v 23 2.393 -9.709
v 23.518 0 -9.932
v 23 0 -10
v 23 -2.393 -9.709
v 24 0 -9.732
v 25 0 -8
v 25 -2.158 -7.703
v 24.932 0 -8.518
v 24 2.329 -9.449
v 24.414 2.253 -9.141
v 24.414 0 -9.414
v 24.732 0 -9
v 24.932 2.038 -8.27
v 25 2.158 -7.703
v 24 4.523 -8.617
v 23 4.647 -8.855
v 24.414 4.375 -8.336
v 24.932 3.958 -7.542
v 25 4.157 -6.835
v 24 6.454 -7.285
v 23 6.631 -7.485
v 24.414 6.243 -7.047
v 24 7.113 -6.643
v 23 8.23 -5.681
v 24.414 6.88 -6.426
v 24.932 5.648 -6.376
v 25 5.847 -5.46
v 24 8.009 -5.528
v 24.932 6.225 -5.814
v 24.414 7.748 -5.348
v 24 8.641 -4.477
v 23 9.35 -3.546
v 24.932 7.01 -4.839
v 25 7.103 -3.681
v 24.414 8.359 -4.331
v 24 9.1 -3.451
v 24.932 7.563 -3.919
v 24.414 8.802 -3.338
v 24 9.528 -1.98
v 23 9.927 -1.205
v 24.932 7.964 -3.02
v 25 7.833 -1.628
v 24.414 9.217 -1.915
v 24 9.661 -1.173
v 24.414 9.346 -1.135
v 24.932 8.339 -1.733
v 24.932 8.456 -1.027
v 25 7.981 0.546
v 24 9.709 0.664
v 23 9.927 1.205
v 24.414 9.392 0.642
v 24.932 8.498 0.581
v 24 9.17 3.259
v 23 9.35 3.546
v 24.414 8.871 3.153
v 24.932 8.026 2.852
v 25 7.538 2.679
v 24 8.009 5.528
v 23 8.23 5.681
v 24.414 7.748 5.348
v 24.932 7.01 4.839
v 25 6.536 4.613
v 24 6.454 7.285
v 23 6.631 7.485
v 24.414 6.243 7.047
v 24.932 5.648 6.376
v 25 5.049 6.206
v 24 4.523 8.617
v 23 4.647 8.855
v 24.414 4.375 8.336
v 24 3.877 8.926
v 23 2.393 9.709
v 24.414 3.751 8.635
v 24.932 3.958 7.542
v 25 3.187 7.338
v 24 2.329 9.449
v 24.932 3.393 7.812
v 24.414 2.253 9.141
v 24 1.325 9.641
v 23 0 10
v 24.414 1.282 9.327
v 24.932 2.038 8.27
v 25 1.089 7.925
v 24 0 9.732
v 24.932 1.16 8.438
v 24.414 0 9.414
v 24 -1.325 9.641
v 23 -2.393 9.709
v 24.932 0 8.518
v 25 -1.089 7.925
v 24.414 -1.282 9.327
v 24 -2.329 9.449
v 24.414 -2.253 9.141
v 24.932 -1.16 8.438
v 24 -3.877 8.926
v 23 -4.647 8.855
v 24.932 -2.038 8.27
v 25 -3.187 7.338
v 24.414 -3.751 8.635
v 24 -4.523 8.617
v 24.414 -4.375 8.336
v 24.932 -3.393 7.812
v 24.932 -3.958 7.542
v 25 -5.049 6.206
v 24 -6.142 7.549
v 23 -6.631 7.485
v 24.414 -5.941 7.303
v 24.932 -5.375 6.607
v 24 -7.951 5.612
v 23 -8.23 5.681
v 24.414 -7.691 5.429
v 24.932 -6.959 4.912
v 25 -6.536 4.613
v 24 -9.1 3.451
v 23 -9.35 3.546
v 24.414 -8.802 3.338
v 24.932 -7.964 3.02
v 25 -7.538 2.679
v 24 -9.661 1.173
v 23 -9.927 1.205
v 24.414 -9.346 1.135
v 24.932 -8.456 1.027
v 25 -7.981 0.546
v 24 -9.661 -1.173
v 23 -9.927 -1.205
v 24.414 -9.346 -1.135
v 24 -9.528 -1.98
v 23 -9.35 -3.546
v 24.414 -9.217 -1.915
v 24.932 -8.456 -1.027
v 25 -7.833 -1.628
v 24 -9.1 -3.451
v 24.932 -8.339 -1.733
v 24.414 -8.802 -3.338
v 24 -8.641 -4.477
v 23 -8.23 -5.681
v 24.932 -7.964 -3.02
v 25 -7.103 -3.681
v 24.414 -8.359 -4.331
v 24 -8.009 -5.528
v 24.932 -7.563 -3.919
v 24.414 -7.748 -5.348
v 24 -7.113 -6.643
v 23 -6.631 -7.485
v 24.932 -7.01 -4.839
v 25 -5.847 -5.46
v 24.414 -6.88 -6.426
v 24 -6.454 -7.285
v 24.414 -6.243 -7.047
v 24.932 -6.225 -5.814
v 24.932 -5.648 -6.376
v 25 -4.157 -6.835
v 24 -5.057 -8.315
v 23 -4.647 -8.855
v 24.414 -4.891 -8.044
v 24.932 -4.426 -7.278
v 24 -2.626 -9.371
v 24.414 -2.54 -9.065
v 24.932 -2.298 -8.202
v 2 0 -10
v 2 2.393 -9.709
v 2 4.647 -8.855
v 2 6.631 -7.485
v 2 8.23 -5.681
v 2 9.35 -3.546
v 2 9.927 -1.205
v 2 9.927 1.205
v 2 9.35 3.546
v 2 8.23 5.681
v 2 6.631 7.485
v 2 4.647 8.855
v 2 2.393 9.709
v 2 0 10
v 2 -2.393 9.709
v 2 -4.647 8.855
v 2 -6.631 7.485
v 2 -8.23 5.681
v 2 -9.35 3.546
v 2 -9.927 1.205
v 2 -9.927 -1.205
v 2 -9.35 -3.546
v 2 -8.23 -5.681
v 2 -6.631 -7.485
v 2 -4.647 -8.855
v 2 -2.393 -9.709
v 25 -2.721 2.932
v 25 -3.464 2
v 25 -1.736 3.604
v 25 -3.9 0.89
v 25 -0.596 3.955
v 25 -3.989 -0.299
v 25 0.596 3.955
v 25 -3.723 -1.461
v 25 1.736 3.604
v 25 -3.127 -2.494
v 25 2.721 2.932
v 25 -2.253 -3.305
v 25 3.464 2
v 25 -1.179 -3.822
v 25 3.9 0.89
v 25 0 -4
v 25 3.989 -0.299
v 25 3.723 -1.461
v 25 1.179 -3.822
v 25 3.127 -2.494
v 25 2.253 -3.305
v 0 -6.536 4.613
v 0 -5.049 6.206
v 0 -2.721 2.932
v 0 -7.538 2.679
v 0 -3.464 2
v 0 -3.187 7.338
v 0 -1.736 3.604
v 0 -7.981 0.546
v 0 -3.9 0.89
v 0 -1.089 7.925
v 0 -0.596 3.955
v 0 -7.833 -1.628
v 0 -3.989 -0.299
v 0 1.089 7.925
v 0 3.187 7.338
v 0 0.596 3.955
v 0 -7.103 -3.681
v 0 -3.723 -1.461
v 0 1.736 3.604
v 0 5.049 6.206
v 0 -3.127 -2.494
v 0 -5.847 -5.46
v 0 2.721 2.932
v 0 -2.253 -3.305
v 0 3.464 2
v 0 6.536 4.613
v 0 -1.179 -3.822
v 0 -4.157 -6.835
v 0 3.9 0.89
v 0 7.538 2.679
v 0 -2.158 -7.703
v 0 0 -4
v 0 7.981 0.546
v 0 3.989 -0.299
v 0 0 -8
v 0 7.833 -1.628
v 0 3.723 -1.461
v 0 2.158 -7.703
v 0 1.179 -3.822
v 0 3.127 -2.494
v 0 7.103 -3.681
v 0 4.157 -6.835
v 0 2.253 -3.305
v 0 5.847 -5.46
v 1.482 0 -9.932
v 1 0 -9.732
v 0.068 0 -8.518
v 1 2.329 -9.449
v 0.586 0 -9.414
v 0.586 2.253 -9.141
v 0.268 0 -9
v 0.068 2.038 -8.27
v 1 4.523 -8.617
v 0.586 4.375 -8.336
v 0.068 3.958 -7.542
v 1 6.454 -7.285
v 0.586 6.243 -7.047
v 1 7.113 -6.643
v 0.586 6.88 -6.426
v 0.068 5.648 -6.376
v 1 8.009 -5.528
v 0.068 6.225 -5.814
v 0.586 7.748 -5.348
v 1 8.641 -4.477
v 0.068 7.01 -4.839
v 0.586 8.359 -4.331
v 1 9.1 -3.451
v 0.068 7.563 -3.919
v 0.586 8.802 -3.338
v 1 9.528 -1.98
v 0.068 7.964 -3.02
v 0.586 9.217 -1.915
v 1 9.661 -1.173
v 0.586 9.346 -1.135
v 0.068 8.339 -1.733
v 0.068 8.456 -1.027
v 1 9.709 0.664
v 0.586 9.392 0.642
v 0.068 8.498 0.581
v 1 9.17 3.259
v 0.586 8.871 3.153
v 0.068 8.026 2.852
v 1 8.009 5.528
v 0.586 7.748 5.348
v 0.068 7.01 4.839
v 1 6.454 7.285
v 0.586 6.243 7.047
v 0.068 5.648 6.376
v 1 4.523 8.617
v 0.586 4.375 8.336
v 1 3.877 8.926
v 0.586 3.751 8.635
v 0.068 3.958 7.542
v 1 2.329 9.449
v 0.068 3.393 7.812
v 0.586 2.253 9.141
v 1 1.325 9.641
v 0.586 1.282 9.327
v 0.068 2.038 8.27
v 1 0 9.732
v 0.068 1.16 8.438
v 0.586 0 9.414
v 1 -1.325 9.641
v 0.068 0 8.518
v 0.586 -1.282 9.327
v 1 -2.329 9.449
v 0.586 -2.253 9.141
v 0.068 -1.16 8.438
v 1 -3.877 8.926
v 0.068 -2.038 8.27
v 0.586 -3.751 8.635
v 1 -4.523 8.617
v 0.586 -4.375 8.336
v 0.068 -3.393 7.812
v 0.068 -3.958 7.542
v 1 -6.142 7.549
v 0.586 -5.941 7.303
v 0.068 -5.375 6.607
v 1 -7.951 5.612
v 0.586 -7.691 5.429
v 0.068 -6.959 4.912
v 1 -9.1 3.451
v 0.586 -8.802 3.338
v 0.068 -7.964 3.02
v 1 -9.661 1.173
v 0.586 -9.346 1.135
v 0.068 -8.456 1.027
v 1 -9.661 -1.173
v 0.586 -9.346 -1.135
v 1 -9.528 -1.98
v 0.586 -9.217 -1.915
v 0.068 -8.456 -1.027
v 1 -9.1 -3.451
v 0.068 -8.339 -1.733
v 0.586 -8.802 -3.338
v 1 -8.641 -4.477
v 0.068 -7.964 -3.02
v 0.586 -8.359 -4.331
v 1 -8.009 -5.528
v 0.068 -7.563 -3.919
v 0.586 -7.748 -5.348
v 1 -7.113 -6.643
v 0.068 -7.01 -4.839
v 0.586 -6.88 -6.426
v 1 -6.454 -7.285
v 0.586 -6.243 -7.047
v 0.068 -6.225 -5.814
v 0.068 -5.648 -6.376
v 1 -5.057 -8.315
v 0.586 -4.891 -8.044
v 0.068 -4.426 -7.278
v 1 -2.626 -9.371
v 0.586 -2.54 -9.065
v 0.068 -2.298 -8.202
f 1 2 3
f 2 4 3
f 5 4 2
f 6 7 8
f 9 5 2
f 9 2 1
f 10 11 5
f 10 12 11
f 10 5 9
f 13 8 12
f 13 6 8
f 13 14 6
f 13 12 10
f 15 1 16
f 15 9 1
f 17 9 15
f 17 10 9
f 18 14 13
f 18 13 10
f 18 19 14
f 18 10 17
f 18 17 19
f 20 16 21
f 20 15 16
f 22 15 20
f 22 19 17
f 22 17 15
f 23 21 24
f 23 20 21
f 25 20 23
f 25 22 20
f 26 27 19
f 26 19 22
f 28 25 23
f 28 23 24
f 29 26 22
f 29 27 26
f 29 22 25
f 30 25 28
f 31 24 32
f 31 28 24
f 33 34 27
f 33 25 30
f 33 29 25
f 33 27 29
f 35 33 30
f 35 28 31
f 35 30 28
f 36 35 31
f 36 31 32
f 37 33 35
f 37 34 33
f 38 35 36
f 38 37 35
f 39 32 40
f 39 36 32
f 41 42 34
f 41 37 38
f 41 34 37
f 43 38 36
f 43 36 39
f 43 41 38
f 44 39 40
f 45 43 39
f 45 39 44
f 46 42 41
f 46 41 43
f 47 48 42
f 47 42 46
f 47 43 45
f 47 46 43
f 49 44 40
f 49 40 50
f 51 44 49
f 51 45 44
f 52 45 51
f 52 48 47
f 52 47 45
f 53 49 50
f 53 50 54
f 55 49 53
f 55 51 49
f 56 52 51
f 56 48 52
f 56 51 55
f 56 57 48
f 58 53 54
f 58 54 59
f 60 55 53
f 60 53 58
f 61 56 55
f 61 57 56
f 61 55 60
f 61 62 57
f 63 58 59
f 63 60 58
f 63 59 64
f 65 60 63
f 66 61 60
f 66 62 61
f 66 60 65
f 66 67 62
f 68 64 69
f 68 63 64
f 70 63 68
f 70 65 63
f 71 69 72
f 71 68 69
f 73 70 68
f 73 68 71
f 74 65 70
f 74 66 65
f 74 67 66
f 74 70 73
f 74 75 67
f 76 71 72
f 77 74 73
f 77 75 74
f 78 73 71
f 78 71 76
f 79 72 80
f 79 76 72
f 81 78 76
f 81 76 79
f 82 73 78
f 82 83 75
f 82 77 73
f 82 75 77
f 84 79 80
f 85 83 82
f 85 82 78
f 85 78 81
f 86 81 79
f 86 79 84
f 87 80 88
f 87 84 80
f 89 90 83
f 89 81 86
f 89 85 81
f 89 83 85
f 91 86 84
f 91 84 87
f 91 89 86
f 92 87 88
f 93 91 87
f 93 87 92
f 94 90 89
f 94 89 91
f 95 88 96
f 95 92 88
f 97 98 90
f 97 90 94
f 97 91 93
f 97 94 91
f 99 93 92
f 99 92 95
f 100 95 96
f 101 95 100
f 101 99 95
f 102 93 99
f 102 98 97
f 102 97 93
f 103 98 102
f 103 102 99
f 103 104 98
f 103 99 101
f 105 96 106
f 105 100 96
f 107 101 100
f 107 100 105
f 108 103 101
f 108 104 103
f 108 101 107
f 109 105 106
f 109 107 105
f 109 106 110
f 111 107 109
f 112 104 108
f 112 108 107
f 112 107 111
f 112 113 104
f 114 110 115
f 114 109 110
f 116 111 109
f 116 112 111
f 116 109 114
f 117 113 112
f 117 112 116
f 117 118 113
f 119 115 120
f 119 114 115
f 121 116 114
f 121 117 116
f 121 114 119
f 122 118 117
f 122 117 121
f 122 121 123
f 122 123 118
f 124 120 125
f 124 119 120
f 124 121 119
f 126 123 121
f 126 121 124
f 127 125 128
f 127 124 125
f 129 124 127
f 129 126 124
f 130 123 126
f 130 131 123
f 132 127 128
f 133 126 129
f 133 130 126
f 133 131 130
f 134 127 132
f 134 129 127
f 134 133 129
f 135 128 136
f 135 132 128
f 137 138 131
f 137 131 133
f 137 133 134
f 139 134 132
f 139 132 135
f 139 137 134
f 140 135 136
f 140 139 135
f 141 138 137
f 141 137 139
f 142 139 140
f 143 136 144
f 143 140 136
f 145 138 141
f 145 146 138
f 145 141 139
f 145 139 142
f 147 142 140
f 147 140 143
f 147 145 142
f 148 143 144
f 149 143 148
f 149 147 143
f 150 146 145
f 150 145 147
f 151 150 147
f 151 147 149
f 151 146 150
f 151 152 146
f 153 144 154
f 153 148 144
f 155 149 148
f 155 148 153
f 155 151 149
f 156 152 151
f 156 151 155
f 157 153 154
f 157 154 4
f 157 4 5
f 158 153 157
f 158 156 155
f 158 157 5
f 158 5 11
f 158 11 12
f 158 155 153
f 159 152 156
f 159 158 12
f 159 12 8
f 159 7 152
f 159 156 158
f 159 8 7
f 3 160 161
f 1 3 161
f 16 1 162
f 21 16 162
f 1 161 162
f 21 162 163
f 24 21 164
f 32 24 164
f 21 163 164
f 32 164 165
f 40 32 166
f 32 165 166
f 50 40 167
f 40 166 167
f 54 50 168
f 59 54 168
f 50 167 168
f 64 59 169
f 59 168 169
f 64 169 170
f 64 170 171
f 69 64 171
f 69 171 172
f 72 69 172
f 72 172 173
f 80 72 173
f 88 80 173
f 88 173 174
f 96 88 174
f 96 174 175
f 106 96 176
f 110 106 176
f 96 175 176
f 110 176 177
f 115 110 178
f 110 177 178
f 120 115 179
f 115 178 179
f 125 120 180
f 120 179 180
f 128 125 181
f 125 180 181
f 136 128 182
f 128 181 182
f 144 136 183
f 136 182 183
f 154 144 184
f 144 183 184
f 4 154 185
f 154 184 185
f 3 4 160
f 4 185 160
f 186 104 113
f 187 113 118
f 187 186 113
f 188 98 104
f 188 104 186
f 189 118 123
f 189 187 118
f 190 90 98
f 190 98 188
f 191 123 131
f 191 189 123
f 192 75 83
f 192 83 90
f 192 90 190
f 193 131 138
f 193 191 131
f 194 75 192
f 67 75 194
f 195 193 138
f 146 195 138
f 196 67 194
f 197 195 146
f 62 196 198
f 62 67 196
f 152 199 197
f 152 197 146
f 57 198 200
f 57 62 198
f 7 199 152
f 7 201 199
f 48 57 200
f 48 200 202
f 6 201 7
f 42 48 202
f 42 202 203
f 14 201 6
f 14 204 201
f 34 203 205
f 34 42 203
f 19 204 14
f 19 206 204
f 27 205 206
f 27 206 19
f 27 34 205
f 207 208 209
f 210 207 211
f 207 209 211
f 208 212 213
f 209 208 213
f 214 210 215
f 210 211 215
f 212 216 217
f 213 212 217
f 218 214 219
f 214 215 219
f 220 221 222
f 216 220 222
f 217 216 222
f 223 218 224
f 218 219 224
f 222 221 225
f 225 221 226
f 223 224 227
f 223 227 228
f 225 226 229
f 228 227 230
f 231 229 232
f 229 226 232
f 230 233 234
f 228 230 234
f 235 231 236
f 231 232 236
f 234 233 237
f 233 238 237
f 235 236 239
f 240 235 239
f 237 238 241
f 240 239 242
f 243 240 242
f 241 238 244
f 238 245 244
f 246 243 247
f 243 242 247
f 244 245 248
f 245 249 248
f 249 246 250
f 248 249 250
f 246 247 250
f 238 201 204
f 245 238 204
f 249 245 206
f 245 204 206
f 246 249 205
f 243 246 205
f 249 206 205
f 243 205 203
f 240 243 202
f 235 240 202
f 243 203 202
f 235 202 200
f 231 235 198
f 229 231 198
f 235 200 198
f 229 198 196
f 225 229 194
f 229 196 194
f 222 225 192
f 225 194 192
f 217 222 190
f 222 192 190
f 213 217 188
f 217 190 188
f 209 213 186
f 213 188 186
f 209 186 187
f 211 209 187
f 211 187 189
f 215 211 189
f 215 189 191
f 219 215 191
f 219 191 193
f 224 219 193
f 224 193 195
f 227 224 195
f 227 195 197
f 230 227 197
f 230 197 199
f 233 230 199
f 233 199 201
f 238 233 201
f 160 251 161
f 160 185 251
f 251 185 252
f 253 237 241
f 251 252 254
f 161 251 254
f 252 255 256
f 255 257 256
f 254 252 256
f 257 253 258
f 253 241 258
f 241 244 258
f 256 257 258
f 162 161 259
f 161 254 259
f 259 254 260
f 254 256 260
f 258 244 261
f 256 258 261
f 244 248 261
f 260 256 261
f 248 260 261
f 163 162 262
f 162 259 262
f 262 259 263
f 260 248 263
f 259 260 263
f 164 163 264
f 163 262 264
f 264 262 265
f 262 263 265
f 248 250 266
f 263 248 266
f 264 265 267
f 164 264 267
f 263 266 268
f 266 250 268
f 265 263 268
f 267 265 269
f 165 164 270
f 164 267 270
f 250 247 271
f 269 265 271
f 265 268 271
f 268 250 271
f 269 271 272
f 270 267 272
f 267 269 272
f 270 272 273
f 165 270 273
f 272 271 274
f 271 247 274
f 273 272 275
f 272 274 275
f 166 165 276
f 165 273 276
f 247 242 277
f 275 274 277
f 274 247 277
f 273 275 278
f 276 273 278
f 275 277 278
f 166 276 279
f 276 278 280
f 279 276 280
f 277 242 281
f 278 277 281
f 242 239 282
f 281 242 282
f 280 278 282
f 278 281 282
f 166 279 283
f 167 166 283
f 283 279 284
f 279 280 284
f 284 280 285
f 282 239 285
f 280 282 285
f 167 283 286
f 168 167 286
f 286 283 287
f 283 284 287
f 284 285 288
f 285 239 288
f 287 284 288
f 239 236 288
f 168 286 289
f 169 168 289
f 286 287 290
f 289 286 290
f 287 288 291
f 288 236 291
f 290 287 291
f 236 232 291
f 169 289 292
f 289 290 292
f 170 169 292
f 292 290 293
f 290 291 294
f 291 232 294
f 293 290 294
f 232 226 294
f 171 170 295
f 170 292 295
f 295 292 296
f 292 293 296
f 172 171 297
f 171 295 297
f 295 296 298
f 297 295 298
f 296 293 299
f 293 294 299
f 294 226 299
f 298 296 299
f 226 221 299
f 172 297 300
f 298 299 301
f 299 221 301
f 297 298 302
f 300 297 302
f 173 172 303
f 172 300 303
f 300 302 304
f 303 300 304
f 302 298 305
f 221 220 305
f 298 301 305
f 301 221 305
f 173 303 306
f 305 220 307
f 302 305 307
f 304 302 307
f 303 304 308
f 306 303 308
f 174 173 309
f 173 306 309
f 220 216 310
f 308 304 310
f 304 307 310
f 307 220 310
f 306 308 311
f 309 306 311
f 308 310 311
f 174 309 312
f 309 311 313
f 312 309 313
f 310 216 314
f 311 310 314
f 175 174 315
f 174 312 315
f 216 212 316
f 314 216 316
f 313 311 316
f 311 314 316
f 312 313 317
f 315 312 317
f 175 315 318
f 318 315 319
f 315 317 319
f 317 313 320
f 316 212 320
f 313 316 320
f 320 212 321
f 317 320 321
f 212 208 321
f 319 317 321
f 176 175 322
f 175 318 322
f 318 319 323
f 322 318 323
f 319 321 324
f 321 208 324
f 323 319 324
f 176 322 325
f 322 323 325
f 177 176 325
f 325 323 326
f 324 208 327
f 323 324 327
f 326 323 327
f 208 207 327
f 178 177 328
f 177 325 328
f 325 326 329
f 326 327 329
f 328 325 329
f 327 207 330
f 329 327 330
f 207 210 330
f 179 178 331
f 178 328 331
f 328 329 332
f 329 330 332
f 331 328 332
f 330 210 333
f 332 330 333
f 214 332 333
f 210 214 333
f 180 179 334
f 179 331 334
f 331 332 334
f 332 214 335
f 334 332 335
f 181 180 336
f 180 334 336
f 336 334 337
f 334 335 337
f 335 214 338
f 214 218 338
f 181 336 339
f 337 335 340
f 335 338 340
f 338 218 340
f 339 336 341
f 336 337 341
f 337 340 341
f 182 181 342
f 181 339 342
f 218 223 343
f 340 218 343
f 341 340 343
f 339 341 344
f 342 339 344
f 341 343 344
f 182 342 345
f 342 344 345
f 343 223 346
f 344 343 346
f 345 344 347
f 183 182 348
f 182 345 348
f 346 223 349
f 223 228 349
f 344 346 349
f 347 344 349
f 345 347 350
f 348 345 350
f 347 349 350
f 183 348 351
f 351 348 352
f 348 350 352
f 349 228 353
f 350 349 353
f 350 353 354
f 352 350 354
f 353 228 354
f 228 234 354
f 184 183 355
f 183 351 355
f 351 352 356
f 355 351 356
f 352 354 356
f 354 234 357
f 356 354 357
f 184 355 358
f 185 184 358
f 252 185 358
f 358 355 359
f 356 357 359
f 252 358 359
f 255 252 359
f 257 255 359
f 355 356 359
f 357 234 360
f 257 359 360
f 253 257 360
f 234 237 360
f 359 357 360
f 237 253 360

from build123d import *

# Parameters (mm, degrees)
SKETCH1_R           = 10
BOSS_EXTRUDE1_DEPTH = 25
SKETCH2_R           = 4
CUT_EXTRUDE1_DEPTH  = 26
FILLET1_R           = 2


with BuildPart() as part:
    # Sketch1 → Boss-Extrude1 (new body)
    with BuildSketch(Plane(origin=(0, 0, 0), x_dir=(0, 0, -1), z_dir=(1, 0, 0))):
        Circle(SKETCH1_R)
    extrude(amount=BOSS_EXTRUDE1_DEPTH)

    # Sketch2 → Cut-Extrude1 (cut, through all)
    with BuildSketch(Plane(origin=(25, 0, 0), x_dir=(0, 0, -1), z_dir=(1, 0, 0))):
        Circle(SKETCH2_R)
    extrude(amount=-CUT_EXTRUDE1_DEPTH, mode=Mode.SUBTRACT)

    # Fillet1
    fillet1_edges = [part.edges().sort_by_distance(p)[0] for p in [
        (0, 0, 10),
        (25, 0, 10),
    ]]
    fillet(fillet1_edges, radius=FILLET1_R)


solid = part.part
